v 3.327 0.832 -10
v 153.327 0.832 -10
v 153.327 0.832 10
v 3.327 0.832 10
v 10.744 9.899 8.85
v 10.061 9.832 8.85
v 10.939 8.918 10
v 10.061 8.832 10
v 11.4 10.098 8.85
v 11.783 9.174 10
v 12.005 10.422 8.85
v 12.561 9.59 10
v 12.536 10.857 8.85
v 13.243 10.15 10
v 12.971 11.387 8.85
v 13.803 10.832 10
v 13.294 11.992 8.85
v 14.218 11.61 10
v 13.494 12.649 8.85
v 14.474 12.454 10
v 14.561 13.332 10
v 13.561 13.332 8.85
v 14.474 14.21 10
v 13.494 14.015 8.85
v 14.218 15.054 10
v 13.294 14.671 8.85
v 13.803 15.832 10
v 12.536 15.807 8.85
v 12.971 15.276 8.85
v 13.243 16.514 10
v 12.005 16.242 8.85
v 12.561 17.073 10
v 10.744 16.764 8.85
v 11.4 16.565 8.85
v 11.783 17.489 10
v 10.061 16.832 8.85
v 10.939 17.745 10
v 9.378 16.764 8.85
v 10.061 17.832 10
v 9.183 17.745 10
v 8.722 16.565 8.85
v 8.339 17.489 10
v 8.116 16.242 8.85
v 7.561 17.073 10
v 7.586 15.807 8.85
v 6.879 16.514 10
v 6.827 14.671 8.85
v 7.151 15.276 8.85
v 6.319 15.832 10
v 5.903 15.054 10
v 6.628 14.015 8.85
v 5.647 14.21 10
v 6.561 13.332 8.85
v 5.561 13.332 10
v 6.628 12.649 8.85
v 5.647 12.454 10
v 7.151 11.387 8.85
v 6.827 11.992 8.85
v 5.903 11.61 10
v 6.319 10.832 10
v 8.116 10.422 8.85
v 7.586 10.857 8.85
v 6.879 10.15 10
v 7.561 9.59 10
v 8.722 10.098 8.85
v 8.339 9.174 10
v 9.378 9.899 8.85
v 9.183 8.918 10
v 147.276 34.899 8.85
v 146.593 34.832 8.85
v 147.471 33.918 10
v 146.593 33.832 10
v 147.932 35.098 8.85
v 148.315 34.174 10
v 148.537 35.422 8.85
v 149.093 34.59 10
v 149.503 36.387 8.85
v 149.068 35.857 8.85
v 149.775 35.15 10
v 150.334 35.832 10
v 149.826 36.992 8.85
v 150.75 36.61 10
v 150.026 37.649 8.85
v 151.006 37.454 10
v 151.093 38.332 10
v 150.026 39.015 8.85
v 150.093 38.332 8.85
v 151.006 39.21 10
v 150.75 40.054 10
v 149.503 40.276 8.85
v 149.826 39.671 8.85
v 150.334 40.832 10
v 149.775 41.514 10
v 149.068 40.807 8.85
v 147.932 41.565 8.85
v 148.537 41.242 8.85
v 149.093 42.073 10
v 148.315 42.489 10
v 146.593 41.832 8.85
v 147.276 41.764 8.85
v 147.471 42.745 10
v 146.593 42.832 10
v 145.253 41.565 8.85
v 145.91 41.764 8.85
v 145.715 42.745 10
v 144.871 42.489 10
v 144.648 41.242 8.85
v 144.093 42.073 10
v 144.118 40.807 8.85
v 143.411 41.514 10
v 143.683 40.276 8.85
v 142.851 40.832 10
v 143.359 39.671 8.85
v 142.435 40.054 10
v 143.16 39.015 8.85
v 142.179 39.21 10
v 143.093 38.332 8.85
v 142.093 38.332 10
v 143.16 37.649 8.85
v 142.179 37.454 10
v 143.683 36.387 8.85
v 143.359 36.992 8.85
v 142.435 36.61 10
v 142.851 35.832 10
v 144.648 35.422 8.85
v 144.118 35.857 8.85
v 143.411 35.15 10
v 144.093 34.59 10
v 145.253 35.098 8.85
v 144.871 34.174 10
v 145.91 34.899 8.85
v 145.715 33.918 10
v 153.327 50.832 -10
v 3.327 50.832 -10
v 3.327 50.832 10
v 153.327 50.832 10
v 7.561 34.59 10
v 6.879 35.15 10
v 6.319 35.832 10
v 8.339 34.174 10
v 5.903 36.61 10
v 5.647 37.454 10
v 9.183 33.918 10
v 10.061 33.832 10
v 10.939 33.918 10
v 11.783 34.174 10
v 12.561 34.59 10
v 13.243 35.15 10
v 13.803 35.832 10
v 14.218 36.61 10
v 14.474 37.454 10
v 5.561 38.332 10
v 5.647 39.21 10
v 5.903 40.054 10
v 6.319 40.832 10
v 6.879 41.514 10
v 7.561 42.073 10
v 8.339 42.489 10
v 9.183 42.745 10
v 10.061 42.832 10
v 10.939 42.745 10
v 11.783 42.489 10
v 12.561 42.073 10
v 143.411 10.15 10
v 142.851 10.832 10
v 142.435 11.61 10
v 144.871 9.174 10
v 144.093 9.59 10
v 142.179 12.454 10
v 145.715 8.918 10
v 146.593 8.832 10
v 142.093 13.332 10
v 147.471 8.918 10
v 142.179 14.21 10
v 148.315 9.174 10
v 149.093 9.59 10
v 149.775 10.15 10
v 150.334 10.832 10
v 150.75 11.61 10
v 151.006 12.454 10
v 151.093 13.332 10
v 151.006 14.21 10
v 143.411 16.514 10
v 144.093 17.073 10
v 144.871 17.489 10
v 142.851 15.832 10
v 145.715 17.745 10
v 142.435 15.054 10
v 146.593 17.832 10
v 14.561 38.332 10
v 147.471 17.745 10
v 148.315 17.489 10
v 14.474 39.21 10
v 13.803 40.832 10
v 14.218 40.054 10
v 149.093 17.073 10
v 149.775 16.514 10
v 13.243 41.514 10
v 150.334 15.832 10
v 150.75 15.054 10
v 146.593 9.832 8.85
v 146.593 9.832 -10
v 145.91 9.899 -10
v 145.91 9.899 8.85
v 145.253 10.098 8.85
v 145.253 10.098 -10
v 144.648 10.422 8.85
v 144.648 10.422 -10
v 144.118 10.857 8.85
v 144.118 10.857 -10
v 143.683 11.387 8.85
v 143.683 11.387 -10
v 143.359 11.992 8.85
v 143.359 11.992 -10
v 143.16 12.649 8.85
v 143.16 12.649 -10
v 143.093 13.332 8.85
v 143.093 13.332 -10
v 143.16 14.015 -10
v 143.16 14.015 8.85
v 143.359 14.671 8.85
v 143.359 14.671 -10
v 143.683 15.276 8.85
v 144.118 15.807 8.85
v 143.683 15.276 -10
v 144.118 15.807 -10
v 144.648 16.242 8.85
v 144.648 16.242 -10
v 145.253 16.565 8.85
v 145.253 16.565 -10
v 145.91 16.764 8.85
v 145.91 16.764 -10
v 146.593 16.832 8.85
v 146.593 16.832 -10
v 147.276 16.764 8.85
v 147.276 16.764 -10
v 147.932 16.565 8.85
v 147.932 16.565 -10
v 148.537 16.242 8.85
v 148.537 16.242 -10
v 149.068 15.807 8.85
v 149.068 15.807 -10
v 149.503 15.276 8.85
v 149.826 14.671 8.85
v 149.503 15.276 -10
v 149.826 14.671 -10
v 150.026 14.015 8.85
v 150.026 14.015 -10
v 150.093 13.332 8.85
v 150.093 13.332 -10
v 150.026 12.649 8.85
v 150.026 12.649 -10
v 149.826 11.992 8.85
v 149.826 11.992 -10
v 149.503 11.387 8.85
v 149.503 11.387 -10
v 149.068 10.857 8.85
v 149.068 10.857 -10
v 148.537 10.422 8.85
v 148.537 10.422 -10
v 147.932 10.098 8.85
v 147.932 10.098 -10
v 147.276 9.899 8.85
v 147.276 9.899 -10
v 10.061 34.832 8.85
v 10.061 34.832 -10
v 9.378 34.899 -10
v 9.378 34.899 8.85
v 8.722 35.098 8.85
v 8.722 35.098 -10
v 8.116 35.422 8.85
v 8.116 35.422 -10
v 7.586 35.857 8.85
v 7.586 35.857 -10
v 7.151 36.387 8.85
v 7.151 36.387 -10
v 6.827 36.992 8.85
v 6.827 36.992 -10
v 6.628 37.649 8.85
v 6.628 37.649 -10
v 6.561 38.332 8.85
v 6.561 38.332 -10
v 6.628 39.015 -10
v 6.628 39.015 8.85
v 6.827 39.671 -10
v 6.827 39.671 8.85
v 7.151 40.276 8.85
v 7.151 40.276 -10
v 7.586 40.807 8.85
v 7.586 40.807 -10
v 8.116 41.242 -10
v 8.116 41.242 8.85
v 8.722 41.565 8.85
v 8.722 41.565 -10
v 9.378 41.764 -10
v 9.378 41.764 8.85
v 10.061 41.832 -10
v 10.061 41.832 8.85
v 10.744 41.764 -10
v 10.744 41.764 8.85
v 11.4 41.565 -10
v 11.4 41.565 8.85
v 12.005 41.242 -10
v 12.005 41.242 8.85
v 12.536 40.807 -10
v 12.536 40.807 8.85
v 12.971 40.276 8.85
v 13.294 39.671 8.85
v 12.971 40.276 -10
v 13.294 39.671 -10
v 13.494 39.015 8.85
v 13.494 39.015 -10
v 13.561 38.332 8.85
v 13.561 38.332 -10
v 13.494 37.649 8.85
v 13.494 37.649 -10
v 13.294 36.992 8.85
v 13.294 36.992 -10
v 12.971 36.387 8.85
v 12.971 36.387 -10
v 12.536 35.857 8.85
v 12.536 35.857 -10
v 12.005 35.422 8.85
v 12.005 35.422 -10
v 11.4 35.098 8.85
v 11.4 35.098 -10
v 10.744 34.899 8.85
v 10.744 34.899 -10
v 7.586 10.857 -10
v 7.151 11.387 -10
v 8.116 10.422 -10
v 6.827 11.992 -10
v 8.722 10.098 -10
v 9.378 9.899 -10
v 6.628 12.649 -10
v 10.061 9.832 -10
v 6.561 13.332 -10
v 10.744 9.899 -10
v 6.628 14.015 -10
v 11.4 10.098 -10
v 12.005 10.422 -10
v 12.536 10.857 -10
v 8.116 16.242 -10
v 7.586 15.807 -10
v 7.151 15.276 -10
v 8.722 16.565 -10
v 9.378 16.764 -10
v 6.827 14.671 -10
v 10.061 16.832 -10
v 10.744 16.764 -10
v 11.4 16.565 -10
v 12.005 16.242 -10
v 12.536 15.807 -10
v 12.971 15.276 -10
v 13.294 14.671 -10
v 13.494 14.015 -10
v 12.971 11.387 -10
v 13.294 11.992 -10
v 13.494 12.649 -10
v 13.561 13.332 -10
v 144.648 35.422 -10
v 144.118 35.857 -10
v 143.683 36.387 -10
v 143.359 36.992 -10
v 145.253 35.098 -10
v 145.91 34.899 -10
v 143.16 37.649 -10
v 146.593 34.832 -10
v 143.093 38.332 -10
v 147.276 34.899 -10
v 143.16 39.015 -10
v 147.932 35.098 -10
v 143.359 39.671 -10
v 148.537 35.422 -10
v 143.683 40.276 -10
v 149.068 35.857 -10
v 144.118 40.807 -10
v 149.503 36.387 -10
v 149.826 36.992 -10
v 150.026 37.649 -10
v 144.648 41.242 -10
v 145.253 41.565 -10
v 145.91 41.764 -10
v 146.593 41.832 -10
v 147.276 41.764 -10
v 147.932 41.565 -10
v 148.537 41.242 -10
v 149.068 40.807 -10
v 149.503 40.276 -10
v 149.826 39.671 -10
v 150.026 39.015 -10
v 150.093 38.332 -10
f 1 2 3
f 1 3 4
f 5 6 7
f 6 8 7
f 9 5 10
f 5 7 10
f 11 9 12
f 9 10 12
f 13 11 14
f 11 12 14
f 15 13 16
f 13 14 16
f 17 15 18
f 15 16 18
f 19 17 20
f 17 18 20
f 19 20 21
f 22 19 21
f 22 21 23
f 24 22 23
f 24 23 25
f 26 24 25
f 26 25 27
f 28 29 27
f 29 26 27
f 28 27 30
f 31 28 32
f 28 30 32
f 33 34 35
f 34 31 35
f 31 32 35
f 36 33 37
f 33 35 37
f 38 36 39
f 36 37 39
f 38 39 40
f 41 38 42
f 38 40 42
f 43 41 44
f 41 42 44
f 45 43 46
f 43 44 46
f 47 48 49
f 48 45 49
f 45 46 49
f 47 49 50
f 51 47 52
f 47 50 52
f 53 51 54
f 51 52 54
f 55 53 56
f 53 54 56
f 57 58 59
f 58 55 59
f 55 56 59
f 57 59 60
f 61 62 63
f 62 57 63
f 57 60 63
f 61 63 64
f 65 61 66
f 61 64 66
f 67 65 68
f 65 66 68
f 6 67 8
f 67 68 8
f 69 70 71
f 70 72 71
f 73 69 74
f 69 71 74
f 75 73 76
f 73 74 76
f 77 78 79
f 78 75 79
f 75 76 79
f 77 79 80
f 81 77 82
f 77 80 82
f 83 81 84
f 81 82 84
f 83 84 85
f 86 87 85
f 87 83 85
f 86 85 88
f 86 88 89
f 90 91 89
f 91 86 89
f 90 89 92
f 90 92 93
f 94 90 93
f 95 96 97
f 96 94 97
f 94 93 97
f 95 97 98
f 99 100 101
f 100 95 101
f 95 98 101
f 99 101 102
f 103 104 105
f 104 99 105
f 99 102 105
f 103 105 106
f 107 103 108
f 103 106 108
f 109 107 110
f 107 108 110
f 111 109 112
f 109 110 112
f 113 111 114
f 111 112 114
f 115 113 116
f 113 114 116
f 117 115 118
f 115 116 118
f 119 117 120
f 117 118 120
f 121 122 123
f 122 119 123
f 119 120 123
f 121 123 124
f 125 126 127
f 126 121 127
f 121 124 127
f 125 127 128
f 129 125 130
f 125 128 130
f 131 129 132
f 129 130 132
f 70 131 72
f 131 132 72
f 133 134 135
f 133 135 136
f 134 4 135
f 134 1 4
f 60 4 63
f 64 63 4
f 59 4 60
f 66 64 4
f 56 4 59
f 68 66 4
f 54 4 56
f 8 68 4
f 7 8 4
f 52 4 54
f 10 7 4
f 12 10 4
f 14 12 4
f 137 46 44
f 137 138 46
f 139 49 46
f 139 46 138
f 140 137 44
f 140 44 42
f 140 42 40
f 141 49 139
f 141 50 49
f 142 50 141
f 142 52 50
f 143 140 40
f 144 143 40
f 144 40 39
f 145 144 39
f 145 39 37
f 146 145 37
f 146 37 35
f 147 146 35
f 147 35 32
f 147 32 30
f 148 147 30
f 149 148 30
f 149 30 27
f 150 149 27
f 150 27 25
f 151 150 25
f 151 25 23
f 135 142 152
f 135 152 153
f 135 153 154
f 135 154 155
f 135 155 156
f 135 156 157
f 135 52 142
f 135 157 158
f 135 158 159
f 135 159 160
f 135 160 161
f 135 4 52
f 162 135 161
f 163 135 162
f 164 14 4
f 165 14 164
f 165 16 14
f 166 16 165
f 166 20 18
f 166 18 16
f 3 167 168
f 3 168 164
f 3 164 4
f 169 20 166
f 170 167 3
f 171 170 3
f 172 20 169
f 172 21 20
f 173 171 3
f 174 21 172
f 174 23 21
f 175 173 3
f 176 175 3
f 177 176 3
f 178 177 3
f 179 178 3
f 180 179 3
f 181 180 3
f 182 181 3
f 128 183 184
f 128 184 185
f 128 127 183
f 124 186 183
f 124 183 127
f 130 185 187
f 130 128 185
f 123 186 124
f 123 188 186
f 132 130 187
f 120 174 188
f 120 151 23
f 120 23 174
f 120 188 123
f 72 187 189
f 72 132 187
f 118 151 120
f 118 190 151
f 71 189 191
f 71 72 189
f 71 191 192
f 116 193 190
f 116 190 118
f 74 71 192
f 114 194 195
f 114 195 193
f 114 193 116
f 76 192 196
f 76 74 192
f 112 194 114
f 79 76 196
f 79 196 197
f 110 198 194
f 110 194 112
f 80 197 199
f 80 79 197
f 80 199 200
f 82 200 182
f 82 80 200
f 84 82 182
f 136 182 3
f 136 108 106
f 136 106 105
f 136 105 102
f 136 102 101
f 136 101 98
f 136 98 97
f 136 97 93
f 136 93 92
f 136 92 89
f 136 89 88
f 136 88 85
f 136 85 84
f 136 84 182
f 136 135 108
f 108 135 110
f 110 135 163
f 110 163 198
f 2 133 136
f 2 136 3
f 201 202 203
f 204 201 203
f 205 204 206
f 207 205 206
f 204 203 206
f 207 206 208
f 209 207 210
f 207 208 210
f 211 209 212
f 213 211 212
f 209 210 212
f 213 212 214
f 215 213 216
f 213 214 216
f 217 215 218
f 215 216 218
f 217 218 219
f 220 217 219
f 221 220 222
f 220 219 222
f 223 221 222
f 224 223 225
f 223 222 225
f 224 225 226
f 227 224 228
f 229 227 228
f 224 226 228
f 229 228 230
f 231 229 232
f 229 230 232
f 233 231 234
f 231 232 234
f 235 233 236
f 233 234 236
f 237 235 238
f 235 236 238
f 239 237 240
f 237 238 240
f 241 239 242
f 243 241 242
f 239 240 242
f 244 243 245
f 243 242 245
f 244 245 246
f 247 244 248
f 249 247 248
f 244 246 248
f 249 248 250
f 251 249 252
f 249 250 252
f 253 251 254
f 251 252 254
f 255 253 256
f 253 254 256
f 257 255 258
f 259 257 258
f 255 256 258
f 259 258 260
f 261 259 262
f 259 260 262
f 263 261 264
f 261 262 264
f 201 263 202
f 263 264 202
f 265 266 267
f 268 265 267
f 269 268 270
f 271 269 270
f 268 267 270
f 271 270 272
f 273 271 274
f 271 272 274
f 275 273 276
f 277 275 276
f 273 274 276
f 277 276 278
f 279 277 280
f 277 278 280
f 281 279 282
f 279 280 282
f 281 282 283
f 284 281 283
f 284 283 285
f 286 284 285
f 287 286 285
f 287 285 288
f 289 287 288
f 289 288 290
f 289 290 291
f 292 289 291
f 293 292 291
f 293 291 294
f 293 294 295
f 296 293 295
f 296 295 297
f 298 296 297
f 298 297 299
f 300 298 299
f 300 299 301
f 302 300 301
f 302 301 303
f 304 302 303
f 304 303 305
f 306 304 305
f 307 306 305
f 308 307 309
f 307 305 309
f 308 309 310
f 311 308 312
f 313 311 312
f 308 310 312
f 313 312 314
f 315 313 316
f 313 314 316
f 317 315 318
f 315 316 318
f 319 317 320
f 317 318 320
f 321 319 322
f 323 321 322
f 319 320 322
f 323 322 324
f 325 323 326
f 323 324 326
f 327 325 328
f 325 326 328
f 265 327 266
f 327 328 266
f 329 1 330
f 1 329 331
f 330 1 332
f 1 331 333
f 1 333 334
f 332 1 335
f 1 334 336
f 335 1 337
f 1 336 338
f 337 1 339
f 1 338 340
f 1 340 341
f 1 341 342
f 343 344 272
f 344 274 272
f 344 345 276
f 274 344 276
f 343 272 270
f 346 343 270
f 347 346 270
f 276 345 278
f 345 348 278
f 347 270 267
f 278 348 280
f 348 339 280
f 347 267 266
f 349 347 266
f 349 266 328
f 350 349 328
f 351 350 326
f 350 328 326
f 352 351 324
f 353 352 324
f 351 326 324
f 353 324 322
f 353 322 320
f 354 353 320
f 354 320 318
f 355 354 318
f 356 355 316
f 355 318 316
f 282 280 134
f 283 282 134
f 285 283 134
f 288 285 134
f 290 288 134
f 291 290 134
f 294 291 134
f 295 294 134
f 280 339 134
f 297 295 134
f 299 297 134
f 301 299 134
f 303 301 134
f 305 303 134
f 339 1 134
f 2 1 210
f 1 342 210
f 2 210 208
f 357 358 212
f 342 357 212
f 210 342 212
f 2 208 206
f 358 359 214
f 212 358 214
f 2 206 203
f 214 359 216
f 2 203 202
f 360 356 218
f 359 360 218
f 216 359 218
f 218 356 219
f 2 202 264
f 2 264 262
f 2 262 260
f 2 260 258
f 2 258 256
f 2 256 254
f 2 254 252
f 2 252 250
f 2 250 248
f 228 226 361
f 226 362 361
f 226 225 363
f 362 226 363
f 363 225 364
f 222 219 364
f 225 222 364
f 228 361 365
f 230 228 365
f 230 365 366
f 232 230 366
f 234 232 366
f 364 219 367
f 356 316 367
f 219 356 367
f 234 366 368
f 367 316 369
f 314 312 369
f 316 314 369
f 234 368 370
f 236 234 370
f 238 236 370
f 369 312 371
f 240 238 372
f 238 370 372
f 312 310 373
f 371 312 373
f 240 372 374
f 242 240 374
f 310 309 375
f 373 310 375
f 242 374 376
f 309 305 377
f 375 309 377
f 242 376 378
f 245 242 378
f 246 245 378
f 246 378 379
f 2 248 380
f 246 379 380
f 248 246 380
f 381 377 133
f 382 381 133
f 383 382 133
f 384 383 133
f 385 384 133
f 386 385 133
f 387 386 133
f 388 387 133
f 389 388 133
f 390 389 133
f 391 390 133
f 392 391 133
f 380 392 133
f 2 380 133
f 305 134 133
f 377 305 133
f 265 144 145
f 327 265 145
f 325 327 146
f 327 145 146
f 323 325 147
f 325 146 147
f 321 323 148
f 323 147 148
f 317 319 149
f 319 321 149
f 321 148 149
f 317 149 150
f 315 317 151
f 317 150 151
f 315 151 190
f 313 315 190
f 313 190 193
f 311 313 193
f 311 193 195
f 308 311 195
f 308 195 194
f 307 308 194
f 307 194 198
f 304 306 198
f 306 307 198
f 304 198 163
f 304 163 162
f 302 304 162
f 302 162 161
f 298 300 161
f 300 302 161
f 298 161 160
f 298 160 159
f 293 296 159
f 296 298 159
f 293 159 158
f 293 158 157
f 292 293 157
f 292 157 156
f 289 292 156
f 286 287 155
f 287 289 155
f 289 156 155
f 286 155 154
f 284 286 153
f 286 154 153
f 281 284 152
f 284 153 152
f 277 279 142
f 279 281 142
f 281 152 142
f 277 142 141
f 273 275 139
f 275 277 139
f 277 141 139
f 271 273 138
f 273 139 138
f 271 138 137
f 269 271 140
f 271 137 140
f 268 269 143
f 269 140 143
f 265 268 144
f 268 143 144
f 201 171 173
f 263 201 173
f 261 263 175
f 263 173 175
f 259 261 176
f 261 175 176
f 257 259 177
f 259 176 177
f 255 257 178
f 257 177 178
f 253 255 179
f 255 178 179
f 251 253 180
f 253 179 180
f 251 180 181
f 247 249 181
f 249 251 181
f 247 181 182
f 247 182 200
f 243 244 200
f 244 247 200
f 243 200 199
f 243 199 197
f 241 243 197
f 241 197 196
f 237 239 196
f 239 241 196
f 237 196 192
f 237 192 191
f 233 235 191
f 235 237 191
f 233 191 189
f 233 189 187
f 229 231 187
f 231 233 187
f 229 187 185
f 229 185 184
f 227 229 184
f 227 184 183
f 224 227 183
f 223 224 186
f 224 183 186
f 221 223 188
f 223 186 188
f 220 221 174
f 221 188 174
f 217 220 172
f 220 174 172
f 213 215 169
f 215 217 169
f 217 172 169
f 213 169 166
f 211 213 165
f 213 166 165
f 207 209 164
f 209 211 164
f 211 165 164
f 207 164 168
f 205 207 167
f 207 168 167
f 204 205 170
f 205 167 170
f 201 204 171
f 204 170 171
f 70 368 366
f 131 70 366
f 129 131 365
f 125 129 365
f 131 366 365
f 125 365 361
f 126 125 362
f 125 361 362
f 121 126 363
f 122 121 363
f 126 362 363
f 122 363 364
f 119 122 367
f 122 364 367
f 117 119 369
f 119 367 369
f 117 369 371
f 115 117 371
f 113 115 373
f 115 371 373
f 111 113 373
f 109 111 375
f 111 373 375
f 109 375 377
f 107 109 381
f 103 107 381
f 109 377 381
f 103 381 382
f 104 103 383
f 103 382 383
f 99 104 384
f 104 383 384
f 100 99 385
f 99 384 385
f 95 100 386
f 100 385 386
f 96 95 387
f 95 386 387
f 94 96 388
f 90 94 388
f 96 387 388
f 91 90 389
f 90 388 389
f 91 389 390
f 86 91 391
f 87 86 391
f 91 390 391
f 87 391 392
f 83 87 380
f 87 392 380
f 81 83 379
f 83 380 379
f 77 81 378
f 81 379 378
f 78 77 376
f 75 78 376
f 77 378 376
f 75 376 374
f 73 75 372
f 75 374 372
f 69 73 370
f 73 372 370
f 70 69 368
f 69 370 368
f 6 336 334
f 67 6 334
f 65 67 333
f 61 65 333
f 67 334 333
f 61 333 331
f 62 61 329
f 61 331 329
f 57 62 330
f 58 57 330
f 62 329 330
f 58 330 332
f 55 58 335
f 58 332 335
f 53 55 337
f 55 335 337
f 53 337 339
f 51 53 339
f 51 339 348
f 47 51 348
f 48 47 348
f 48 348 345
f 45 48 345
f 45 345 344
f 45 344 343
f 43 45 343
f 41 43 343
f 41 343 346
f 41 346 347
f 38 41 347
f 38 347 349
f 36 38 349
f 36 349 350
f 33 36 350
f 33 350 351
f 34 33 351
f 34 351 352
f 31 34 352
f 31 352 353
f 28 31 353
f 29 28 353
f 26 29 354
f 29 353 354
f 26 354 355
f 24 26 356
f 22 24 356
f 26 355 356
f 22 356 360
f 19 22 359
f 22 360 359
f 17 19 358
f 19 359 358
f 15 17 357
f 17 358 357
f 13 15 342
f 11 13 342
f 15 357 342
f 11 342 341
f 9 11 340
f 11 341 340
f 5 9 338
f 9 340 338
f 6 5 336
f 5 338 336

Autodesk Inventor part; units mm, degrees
ref_plane "YZ Plane" through (0, 0, 0) normal (1, 0, 0) x (0, 1, 0)
ref_plane "XZ Plane" through (0, 0, 0) normal (0, 1, 0) x (-1, 0, 0)
ref_plane "XY Plane" through (0, 0, 0) normal (0, 0, 1) x (1, 0, 0)
sketch "Boceto1" plane through (0, 0, 0) normal (0, 0, 1) x (1, 0, 0)
  line L0 (3.3269, 0.8317) -> (3.3269, 50.8317)
  line L1 (3.3269, 50.8317) -> (153.3269, 50.8317)
  line L2 (153.3269, 50.8317) -> (153.3269, 0.8317)
  line L3 (153.3269, 0.8317) -> (3.3269, 0.8317)
  point P0 (0, 0)
  dimension "d0" = 150
  dimension "d1" = 50
extrude "Extrusión1" add sketch "Boceto1" along normal mid plane 20
sketch "Boceto3" plane through (0, 0, 10) normal (0, 0, 1) x (1, 0, 0)
  circle A0 centre (146.5928, 38.3317) radius 3.5
  circle A1 centre (146.5928, 13.3317) radius 3.5
  line L0 (3.3269, 50.8317) -> (153.3269, 50.8317) projected
  circle A2 centre (146.5928, 38.3317) radius 4.5
  circle A3 centre (146.5928, 13.3317) radius 4.5
  line L1 (153.3269, 50.8317) -> (3.3269, 50.8317) projected
  circle A4 centre (10.0609, 38.3317) radius 3.5
  circle A5 centre (10.0609, 13.3317) radius 3.5
  circle A6 centre (10.0609, 38.3317) radius 4.5
  circle A7 centre (10.0609, 13.3317) radius 4.5
  point P0 (0, 0)
  dimension "d8" = 7
  dimension "d9" = 7
  dimension "d10" = 25
  dimension "d11" = 12.5
  dimension "d12" = 9
  dimension "d13" = 9
hole "Agujero1" at (10.0609, 38.3317, 10) at (10.0609, 13.3317, 10) at (146.5928, 38.3317, 10) at (146.5928, 13.3317, 10) direction (0, 0, -1) diameter 7 depth 40 countersink diameter 9 countersink angle 82
properties part number "soporte_rueca"
